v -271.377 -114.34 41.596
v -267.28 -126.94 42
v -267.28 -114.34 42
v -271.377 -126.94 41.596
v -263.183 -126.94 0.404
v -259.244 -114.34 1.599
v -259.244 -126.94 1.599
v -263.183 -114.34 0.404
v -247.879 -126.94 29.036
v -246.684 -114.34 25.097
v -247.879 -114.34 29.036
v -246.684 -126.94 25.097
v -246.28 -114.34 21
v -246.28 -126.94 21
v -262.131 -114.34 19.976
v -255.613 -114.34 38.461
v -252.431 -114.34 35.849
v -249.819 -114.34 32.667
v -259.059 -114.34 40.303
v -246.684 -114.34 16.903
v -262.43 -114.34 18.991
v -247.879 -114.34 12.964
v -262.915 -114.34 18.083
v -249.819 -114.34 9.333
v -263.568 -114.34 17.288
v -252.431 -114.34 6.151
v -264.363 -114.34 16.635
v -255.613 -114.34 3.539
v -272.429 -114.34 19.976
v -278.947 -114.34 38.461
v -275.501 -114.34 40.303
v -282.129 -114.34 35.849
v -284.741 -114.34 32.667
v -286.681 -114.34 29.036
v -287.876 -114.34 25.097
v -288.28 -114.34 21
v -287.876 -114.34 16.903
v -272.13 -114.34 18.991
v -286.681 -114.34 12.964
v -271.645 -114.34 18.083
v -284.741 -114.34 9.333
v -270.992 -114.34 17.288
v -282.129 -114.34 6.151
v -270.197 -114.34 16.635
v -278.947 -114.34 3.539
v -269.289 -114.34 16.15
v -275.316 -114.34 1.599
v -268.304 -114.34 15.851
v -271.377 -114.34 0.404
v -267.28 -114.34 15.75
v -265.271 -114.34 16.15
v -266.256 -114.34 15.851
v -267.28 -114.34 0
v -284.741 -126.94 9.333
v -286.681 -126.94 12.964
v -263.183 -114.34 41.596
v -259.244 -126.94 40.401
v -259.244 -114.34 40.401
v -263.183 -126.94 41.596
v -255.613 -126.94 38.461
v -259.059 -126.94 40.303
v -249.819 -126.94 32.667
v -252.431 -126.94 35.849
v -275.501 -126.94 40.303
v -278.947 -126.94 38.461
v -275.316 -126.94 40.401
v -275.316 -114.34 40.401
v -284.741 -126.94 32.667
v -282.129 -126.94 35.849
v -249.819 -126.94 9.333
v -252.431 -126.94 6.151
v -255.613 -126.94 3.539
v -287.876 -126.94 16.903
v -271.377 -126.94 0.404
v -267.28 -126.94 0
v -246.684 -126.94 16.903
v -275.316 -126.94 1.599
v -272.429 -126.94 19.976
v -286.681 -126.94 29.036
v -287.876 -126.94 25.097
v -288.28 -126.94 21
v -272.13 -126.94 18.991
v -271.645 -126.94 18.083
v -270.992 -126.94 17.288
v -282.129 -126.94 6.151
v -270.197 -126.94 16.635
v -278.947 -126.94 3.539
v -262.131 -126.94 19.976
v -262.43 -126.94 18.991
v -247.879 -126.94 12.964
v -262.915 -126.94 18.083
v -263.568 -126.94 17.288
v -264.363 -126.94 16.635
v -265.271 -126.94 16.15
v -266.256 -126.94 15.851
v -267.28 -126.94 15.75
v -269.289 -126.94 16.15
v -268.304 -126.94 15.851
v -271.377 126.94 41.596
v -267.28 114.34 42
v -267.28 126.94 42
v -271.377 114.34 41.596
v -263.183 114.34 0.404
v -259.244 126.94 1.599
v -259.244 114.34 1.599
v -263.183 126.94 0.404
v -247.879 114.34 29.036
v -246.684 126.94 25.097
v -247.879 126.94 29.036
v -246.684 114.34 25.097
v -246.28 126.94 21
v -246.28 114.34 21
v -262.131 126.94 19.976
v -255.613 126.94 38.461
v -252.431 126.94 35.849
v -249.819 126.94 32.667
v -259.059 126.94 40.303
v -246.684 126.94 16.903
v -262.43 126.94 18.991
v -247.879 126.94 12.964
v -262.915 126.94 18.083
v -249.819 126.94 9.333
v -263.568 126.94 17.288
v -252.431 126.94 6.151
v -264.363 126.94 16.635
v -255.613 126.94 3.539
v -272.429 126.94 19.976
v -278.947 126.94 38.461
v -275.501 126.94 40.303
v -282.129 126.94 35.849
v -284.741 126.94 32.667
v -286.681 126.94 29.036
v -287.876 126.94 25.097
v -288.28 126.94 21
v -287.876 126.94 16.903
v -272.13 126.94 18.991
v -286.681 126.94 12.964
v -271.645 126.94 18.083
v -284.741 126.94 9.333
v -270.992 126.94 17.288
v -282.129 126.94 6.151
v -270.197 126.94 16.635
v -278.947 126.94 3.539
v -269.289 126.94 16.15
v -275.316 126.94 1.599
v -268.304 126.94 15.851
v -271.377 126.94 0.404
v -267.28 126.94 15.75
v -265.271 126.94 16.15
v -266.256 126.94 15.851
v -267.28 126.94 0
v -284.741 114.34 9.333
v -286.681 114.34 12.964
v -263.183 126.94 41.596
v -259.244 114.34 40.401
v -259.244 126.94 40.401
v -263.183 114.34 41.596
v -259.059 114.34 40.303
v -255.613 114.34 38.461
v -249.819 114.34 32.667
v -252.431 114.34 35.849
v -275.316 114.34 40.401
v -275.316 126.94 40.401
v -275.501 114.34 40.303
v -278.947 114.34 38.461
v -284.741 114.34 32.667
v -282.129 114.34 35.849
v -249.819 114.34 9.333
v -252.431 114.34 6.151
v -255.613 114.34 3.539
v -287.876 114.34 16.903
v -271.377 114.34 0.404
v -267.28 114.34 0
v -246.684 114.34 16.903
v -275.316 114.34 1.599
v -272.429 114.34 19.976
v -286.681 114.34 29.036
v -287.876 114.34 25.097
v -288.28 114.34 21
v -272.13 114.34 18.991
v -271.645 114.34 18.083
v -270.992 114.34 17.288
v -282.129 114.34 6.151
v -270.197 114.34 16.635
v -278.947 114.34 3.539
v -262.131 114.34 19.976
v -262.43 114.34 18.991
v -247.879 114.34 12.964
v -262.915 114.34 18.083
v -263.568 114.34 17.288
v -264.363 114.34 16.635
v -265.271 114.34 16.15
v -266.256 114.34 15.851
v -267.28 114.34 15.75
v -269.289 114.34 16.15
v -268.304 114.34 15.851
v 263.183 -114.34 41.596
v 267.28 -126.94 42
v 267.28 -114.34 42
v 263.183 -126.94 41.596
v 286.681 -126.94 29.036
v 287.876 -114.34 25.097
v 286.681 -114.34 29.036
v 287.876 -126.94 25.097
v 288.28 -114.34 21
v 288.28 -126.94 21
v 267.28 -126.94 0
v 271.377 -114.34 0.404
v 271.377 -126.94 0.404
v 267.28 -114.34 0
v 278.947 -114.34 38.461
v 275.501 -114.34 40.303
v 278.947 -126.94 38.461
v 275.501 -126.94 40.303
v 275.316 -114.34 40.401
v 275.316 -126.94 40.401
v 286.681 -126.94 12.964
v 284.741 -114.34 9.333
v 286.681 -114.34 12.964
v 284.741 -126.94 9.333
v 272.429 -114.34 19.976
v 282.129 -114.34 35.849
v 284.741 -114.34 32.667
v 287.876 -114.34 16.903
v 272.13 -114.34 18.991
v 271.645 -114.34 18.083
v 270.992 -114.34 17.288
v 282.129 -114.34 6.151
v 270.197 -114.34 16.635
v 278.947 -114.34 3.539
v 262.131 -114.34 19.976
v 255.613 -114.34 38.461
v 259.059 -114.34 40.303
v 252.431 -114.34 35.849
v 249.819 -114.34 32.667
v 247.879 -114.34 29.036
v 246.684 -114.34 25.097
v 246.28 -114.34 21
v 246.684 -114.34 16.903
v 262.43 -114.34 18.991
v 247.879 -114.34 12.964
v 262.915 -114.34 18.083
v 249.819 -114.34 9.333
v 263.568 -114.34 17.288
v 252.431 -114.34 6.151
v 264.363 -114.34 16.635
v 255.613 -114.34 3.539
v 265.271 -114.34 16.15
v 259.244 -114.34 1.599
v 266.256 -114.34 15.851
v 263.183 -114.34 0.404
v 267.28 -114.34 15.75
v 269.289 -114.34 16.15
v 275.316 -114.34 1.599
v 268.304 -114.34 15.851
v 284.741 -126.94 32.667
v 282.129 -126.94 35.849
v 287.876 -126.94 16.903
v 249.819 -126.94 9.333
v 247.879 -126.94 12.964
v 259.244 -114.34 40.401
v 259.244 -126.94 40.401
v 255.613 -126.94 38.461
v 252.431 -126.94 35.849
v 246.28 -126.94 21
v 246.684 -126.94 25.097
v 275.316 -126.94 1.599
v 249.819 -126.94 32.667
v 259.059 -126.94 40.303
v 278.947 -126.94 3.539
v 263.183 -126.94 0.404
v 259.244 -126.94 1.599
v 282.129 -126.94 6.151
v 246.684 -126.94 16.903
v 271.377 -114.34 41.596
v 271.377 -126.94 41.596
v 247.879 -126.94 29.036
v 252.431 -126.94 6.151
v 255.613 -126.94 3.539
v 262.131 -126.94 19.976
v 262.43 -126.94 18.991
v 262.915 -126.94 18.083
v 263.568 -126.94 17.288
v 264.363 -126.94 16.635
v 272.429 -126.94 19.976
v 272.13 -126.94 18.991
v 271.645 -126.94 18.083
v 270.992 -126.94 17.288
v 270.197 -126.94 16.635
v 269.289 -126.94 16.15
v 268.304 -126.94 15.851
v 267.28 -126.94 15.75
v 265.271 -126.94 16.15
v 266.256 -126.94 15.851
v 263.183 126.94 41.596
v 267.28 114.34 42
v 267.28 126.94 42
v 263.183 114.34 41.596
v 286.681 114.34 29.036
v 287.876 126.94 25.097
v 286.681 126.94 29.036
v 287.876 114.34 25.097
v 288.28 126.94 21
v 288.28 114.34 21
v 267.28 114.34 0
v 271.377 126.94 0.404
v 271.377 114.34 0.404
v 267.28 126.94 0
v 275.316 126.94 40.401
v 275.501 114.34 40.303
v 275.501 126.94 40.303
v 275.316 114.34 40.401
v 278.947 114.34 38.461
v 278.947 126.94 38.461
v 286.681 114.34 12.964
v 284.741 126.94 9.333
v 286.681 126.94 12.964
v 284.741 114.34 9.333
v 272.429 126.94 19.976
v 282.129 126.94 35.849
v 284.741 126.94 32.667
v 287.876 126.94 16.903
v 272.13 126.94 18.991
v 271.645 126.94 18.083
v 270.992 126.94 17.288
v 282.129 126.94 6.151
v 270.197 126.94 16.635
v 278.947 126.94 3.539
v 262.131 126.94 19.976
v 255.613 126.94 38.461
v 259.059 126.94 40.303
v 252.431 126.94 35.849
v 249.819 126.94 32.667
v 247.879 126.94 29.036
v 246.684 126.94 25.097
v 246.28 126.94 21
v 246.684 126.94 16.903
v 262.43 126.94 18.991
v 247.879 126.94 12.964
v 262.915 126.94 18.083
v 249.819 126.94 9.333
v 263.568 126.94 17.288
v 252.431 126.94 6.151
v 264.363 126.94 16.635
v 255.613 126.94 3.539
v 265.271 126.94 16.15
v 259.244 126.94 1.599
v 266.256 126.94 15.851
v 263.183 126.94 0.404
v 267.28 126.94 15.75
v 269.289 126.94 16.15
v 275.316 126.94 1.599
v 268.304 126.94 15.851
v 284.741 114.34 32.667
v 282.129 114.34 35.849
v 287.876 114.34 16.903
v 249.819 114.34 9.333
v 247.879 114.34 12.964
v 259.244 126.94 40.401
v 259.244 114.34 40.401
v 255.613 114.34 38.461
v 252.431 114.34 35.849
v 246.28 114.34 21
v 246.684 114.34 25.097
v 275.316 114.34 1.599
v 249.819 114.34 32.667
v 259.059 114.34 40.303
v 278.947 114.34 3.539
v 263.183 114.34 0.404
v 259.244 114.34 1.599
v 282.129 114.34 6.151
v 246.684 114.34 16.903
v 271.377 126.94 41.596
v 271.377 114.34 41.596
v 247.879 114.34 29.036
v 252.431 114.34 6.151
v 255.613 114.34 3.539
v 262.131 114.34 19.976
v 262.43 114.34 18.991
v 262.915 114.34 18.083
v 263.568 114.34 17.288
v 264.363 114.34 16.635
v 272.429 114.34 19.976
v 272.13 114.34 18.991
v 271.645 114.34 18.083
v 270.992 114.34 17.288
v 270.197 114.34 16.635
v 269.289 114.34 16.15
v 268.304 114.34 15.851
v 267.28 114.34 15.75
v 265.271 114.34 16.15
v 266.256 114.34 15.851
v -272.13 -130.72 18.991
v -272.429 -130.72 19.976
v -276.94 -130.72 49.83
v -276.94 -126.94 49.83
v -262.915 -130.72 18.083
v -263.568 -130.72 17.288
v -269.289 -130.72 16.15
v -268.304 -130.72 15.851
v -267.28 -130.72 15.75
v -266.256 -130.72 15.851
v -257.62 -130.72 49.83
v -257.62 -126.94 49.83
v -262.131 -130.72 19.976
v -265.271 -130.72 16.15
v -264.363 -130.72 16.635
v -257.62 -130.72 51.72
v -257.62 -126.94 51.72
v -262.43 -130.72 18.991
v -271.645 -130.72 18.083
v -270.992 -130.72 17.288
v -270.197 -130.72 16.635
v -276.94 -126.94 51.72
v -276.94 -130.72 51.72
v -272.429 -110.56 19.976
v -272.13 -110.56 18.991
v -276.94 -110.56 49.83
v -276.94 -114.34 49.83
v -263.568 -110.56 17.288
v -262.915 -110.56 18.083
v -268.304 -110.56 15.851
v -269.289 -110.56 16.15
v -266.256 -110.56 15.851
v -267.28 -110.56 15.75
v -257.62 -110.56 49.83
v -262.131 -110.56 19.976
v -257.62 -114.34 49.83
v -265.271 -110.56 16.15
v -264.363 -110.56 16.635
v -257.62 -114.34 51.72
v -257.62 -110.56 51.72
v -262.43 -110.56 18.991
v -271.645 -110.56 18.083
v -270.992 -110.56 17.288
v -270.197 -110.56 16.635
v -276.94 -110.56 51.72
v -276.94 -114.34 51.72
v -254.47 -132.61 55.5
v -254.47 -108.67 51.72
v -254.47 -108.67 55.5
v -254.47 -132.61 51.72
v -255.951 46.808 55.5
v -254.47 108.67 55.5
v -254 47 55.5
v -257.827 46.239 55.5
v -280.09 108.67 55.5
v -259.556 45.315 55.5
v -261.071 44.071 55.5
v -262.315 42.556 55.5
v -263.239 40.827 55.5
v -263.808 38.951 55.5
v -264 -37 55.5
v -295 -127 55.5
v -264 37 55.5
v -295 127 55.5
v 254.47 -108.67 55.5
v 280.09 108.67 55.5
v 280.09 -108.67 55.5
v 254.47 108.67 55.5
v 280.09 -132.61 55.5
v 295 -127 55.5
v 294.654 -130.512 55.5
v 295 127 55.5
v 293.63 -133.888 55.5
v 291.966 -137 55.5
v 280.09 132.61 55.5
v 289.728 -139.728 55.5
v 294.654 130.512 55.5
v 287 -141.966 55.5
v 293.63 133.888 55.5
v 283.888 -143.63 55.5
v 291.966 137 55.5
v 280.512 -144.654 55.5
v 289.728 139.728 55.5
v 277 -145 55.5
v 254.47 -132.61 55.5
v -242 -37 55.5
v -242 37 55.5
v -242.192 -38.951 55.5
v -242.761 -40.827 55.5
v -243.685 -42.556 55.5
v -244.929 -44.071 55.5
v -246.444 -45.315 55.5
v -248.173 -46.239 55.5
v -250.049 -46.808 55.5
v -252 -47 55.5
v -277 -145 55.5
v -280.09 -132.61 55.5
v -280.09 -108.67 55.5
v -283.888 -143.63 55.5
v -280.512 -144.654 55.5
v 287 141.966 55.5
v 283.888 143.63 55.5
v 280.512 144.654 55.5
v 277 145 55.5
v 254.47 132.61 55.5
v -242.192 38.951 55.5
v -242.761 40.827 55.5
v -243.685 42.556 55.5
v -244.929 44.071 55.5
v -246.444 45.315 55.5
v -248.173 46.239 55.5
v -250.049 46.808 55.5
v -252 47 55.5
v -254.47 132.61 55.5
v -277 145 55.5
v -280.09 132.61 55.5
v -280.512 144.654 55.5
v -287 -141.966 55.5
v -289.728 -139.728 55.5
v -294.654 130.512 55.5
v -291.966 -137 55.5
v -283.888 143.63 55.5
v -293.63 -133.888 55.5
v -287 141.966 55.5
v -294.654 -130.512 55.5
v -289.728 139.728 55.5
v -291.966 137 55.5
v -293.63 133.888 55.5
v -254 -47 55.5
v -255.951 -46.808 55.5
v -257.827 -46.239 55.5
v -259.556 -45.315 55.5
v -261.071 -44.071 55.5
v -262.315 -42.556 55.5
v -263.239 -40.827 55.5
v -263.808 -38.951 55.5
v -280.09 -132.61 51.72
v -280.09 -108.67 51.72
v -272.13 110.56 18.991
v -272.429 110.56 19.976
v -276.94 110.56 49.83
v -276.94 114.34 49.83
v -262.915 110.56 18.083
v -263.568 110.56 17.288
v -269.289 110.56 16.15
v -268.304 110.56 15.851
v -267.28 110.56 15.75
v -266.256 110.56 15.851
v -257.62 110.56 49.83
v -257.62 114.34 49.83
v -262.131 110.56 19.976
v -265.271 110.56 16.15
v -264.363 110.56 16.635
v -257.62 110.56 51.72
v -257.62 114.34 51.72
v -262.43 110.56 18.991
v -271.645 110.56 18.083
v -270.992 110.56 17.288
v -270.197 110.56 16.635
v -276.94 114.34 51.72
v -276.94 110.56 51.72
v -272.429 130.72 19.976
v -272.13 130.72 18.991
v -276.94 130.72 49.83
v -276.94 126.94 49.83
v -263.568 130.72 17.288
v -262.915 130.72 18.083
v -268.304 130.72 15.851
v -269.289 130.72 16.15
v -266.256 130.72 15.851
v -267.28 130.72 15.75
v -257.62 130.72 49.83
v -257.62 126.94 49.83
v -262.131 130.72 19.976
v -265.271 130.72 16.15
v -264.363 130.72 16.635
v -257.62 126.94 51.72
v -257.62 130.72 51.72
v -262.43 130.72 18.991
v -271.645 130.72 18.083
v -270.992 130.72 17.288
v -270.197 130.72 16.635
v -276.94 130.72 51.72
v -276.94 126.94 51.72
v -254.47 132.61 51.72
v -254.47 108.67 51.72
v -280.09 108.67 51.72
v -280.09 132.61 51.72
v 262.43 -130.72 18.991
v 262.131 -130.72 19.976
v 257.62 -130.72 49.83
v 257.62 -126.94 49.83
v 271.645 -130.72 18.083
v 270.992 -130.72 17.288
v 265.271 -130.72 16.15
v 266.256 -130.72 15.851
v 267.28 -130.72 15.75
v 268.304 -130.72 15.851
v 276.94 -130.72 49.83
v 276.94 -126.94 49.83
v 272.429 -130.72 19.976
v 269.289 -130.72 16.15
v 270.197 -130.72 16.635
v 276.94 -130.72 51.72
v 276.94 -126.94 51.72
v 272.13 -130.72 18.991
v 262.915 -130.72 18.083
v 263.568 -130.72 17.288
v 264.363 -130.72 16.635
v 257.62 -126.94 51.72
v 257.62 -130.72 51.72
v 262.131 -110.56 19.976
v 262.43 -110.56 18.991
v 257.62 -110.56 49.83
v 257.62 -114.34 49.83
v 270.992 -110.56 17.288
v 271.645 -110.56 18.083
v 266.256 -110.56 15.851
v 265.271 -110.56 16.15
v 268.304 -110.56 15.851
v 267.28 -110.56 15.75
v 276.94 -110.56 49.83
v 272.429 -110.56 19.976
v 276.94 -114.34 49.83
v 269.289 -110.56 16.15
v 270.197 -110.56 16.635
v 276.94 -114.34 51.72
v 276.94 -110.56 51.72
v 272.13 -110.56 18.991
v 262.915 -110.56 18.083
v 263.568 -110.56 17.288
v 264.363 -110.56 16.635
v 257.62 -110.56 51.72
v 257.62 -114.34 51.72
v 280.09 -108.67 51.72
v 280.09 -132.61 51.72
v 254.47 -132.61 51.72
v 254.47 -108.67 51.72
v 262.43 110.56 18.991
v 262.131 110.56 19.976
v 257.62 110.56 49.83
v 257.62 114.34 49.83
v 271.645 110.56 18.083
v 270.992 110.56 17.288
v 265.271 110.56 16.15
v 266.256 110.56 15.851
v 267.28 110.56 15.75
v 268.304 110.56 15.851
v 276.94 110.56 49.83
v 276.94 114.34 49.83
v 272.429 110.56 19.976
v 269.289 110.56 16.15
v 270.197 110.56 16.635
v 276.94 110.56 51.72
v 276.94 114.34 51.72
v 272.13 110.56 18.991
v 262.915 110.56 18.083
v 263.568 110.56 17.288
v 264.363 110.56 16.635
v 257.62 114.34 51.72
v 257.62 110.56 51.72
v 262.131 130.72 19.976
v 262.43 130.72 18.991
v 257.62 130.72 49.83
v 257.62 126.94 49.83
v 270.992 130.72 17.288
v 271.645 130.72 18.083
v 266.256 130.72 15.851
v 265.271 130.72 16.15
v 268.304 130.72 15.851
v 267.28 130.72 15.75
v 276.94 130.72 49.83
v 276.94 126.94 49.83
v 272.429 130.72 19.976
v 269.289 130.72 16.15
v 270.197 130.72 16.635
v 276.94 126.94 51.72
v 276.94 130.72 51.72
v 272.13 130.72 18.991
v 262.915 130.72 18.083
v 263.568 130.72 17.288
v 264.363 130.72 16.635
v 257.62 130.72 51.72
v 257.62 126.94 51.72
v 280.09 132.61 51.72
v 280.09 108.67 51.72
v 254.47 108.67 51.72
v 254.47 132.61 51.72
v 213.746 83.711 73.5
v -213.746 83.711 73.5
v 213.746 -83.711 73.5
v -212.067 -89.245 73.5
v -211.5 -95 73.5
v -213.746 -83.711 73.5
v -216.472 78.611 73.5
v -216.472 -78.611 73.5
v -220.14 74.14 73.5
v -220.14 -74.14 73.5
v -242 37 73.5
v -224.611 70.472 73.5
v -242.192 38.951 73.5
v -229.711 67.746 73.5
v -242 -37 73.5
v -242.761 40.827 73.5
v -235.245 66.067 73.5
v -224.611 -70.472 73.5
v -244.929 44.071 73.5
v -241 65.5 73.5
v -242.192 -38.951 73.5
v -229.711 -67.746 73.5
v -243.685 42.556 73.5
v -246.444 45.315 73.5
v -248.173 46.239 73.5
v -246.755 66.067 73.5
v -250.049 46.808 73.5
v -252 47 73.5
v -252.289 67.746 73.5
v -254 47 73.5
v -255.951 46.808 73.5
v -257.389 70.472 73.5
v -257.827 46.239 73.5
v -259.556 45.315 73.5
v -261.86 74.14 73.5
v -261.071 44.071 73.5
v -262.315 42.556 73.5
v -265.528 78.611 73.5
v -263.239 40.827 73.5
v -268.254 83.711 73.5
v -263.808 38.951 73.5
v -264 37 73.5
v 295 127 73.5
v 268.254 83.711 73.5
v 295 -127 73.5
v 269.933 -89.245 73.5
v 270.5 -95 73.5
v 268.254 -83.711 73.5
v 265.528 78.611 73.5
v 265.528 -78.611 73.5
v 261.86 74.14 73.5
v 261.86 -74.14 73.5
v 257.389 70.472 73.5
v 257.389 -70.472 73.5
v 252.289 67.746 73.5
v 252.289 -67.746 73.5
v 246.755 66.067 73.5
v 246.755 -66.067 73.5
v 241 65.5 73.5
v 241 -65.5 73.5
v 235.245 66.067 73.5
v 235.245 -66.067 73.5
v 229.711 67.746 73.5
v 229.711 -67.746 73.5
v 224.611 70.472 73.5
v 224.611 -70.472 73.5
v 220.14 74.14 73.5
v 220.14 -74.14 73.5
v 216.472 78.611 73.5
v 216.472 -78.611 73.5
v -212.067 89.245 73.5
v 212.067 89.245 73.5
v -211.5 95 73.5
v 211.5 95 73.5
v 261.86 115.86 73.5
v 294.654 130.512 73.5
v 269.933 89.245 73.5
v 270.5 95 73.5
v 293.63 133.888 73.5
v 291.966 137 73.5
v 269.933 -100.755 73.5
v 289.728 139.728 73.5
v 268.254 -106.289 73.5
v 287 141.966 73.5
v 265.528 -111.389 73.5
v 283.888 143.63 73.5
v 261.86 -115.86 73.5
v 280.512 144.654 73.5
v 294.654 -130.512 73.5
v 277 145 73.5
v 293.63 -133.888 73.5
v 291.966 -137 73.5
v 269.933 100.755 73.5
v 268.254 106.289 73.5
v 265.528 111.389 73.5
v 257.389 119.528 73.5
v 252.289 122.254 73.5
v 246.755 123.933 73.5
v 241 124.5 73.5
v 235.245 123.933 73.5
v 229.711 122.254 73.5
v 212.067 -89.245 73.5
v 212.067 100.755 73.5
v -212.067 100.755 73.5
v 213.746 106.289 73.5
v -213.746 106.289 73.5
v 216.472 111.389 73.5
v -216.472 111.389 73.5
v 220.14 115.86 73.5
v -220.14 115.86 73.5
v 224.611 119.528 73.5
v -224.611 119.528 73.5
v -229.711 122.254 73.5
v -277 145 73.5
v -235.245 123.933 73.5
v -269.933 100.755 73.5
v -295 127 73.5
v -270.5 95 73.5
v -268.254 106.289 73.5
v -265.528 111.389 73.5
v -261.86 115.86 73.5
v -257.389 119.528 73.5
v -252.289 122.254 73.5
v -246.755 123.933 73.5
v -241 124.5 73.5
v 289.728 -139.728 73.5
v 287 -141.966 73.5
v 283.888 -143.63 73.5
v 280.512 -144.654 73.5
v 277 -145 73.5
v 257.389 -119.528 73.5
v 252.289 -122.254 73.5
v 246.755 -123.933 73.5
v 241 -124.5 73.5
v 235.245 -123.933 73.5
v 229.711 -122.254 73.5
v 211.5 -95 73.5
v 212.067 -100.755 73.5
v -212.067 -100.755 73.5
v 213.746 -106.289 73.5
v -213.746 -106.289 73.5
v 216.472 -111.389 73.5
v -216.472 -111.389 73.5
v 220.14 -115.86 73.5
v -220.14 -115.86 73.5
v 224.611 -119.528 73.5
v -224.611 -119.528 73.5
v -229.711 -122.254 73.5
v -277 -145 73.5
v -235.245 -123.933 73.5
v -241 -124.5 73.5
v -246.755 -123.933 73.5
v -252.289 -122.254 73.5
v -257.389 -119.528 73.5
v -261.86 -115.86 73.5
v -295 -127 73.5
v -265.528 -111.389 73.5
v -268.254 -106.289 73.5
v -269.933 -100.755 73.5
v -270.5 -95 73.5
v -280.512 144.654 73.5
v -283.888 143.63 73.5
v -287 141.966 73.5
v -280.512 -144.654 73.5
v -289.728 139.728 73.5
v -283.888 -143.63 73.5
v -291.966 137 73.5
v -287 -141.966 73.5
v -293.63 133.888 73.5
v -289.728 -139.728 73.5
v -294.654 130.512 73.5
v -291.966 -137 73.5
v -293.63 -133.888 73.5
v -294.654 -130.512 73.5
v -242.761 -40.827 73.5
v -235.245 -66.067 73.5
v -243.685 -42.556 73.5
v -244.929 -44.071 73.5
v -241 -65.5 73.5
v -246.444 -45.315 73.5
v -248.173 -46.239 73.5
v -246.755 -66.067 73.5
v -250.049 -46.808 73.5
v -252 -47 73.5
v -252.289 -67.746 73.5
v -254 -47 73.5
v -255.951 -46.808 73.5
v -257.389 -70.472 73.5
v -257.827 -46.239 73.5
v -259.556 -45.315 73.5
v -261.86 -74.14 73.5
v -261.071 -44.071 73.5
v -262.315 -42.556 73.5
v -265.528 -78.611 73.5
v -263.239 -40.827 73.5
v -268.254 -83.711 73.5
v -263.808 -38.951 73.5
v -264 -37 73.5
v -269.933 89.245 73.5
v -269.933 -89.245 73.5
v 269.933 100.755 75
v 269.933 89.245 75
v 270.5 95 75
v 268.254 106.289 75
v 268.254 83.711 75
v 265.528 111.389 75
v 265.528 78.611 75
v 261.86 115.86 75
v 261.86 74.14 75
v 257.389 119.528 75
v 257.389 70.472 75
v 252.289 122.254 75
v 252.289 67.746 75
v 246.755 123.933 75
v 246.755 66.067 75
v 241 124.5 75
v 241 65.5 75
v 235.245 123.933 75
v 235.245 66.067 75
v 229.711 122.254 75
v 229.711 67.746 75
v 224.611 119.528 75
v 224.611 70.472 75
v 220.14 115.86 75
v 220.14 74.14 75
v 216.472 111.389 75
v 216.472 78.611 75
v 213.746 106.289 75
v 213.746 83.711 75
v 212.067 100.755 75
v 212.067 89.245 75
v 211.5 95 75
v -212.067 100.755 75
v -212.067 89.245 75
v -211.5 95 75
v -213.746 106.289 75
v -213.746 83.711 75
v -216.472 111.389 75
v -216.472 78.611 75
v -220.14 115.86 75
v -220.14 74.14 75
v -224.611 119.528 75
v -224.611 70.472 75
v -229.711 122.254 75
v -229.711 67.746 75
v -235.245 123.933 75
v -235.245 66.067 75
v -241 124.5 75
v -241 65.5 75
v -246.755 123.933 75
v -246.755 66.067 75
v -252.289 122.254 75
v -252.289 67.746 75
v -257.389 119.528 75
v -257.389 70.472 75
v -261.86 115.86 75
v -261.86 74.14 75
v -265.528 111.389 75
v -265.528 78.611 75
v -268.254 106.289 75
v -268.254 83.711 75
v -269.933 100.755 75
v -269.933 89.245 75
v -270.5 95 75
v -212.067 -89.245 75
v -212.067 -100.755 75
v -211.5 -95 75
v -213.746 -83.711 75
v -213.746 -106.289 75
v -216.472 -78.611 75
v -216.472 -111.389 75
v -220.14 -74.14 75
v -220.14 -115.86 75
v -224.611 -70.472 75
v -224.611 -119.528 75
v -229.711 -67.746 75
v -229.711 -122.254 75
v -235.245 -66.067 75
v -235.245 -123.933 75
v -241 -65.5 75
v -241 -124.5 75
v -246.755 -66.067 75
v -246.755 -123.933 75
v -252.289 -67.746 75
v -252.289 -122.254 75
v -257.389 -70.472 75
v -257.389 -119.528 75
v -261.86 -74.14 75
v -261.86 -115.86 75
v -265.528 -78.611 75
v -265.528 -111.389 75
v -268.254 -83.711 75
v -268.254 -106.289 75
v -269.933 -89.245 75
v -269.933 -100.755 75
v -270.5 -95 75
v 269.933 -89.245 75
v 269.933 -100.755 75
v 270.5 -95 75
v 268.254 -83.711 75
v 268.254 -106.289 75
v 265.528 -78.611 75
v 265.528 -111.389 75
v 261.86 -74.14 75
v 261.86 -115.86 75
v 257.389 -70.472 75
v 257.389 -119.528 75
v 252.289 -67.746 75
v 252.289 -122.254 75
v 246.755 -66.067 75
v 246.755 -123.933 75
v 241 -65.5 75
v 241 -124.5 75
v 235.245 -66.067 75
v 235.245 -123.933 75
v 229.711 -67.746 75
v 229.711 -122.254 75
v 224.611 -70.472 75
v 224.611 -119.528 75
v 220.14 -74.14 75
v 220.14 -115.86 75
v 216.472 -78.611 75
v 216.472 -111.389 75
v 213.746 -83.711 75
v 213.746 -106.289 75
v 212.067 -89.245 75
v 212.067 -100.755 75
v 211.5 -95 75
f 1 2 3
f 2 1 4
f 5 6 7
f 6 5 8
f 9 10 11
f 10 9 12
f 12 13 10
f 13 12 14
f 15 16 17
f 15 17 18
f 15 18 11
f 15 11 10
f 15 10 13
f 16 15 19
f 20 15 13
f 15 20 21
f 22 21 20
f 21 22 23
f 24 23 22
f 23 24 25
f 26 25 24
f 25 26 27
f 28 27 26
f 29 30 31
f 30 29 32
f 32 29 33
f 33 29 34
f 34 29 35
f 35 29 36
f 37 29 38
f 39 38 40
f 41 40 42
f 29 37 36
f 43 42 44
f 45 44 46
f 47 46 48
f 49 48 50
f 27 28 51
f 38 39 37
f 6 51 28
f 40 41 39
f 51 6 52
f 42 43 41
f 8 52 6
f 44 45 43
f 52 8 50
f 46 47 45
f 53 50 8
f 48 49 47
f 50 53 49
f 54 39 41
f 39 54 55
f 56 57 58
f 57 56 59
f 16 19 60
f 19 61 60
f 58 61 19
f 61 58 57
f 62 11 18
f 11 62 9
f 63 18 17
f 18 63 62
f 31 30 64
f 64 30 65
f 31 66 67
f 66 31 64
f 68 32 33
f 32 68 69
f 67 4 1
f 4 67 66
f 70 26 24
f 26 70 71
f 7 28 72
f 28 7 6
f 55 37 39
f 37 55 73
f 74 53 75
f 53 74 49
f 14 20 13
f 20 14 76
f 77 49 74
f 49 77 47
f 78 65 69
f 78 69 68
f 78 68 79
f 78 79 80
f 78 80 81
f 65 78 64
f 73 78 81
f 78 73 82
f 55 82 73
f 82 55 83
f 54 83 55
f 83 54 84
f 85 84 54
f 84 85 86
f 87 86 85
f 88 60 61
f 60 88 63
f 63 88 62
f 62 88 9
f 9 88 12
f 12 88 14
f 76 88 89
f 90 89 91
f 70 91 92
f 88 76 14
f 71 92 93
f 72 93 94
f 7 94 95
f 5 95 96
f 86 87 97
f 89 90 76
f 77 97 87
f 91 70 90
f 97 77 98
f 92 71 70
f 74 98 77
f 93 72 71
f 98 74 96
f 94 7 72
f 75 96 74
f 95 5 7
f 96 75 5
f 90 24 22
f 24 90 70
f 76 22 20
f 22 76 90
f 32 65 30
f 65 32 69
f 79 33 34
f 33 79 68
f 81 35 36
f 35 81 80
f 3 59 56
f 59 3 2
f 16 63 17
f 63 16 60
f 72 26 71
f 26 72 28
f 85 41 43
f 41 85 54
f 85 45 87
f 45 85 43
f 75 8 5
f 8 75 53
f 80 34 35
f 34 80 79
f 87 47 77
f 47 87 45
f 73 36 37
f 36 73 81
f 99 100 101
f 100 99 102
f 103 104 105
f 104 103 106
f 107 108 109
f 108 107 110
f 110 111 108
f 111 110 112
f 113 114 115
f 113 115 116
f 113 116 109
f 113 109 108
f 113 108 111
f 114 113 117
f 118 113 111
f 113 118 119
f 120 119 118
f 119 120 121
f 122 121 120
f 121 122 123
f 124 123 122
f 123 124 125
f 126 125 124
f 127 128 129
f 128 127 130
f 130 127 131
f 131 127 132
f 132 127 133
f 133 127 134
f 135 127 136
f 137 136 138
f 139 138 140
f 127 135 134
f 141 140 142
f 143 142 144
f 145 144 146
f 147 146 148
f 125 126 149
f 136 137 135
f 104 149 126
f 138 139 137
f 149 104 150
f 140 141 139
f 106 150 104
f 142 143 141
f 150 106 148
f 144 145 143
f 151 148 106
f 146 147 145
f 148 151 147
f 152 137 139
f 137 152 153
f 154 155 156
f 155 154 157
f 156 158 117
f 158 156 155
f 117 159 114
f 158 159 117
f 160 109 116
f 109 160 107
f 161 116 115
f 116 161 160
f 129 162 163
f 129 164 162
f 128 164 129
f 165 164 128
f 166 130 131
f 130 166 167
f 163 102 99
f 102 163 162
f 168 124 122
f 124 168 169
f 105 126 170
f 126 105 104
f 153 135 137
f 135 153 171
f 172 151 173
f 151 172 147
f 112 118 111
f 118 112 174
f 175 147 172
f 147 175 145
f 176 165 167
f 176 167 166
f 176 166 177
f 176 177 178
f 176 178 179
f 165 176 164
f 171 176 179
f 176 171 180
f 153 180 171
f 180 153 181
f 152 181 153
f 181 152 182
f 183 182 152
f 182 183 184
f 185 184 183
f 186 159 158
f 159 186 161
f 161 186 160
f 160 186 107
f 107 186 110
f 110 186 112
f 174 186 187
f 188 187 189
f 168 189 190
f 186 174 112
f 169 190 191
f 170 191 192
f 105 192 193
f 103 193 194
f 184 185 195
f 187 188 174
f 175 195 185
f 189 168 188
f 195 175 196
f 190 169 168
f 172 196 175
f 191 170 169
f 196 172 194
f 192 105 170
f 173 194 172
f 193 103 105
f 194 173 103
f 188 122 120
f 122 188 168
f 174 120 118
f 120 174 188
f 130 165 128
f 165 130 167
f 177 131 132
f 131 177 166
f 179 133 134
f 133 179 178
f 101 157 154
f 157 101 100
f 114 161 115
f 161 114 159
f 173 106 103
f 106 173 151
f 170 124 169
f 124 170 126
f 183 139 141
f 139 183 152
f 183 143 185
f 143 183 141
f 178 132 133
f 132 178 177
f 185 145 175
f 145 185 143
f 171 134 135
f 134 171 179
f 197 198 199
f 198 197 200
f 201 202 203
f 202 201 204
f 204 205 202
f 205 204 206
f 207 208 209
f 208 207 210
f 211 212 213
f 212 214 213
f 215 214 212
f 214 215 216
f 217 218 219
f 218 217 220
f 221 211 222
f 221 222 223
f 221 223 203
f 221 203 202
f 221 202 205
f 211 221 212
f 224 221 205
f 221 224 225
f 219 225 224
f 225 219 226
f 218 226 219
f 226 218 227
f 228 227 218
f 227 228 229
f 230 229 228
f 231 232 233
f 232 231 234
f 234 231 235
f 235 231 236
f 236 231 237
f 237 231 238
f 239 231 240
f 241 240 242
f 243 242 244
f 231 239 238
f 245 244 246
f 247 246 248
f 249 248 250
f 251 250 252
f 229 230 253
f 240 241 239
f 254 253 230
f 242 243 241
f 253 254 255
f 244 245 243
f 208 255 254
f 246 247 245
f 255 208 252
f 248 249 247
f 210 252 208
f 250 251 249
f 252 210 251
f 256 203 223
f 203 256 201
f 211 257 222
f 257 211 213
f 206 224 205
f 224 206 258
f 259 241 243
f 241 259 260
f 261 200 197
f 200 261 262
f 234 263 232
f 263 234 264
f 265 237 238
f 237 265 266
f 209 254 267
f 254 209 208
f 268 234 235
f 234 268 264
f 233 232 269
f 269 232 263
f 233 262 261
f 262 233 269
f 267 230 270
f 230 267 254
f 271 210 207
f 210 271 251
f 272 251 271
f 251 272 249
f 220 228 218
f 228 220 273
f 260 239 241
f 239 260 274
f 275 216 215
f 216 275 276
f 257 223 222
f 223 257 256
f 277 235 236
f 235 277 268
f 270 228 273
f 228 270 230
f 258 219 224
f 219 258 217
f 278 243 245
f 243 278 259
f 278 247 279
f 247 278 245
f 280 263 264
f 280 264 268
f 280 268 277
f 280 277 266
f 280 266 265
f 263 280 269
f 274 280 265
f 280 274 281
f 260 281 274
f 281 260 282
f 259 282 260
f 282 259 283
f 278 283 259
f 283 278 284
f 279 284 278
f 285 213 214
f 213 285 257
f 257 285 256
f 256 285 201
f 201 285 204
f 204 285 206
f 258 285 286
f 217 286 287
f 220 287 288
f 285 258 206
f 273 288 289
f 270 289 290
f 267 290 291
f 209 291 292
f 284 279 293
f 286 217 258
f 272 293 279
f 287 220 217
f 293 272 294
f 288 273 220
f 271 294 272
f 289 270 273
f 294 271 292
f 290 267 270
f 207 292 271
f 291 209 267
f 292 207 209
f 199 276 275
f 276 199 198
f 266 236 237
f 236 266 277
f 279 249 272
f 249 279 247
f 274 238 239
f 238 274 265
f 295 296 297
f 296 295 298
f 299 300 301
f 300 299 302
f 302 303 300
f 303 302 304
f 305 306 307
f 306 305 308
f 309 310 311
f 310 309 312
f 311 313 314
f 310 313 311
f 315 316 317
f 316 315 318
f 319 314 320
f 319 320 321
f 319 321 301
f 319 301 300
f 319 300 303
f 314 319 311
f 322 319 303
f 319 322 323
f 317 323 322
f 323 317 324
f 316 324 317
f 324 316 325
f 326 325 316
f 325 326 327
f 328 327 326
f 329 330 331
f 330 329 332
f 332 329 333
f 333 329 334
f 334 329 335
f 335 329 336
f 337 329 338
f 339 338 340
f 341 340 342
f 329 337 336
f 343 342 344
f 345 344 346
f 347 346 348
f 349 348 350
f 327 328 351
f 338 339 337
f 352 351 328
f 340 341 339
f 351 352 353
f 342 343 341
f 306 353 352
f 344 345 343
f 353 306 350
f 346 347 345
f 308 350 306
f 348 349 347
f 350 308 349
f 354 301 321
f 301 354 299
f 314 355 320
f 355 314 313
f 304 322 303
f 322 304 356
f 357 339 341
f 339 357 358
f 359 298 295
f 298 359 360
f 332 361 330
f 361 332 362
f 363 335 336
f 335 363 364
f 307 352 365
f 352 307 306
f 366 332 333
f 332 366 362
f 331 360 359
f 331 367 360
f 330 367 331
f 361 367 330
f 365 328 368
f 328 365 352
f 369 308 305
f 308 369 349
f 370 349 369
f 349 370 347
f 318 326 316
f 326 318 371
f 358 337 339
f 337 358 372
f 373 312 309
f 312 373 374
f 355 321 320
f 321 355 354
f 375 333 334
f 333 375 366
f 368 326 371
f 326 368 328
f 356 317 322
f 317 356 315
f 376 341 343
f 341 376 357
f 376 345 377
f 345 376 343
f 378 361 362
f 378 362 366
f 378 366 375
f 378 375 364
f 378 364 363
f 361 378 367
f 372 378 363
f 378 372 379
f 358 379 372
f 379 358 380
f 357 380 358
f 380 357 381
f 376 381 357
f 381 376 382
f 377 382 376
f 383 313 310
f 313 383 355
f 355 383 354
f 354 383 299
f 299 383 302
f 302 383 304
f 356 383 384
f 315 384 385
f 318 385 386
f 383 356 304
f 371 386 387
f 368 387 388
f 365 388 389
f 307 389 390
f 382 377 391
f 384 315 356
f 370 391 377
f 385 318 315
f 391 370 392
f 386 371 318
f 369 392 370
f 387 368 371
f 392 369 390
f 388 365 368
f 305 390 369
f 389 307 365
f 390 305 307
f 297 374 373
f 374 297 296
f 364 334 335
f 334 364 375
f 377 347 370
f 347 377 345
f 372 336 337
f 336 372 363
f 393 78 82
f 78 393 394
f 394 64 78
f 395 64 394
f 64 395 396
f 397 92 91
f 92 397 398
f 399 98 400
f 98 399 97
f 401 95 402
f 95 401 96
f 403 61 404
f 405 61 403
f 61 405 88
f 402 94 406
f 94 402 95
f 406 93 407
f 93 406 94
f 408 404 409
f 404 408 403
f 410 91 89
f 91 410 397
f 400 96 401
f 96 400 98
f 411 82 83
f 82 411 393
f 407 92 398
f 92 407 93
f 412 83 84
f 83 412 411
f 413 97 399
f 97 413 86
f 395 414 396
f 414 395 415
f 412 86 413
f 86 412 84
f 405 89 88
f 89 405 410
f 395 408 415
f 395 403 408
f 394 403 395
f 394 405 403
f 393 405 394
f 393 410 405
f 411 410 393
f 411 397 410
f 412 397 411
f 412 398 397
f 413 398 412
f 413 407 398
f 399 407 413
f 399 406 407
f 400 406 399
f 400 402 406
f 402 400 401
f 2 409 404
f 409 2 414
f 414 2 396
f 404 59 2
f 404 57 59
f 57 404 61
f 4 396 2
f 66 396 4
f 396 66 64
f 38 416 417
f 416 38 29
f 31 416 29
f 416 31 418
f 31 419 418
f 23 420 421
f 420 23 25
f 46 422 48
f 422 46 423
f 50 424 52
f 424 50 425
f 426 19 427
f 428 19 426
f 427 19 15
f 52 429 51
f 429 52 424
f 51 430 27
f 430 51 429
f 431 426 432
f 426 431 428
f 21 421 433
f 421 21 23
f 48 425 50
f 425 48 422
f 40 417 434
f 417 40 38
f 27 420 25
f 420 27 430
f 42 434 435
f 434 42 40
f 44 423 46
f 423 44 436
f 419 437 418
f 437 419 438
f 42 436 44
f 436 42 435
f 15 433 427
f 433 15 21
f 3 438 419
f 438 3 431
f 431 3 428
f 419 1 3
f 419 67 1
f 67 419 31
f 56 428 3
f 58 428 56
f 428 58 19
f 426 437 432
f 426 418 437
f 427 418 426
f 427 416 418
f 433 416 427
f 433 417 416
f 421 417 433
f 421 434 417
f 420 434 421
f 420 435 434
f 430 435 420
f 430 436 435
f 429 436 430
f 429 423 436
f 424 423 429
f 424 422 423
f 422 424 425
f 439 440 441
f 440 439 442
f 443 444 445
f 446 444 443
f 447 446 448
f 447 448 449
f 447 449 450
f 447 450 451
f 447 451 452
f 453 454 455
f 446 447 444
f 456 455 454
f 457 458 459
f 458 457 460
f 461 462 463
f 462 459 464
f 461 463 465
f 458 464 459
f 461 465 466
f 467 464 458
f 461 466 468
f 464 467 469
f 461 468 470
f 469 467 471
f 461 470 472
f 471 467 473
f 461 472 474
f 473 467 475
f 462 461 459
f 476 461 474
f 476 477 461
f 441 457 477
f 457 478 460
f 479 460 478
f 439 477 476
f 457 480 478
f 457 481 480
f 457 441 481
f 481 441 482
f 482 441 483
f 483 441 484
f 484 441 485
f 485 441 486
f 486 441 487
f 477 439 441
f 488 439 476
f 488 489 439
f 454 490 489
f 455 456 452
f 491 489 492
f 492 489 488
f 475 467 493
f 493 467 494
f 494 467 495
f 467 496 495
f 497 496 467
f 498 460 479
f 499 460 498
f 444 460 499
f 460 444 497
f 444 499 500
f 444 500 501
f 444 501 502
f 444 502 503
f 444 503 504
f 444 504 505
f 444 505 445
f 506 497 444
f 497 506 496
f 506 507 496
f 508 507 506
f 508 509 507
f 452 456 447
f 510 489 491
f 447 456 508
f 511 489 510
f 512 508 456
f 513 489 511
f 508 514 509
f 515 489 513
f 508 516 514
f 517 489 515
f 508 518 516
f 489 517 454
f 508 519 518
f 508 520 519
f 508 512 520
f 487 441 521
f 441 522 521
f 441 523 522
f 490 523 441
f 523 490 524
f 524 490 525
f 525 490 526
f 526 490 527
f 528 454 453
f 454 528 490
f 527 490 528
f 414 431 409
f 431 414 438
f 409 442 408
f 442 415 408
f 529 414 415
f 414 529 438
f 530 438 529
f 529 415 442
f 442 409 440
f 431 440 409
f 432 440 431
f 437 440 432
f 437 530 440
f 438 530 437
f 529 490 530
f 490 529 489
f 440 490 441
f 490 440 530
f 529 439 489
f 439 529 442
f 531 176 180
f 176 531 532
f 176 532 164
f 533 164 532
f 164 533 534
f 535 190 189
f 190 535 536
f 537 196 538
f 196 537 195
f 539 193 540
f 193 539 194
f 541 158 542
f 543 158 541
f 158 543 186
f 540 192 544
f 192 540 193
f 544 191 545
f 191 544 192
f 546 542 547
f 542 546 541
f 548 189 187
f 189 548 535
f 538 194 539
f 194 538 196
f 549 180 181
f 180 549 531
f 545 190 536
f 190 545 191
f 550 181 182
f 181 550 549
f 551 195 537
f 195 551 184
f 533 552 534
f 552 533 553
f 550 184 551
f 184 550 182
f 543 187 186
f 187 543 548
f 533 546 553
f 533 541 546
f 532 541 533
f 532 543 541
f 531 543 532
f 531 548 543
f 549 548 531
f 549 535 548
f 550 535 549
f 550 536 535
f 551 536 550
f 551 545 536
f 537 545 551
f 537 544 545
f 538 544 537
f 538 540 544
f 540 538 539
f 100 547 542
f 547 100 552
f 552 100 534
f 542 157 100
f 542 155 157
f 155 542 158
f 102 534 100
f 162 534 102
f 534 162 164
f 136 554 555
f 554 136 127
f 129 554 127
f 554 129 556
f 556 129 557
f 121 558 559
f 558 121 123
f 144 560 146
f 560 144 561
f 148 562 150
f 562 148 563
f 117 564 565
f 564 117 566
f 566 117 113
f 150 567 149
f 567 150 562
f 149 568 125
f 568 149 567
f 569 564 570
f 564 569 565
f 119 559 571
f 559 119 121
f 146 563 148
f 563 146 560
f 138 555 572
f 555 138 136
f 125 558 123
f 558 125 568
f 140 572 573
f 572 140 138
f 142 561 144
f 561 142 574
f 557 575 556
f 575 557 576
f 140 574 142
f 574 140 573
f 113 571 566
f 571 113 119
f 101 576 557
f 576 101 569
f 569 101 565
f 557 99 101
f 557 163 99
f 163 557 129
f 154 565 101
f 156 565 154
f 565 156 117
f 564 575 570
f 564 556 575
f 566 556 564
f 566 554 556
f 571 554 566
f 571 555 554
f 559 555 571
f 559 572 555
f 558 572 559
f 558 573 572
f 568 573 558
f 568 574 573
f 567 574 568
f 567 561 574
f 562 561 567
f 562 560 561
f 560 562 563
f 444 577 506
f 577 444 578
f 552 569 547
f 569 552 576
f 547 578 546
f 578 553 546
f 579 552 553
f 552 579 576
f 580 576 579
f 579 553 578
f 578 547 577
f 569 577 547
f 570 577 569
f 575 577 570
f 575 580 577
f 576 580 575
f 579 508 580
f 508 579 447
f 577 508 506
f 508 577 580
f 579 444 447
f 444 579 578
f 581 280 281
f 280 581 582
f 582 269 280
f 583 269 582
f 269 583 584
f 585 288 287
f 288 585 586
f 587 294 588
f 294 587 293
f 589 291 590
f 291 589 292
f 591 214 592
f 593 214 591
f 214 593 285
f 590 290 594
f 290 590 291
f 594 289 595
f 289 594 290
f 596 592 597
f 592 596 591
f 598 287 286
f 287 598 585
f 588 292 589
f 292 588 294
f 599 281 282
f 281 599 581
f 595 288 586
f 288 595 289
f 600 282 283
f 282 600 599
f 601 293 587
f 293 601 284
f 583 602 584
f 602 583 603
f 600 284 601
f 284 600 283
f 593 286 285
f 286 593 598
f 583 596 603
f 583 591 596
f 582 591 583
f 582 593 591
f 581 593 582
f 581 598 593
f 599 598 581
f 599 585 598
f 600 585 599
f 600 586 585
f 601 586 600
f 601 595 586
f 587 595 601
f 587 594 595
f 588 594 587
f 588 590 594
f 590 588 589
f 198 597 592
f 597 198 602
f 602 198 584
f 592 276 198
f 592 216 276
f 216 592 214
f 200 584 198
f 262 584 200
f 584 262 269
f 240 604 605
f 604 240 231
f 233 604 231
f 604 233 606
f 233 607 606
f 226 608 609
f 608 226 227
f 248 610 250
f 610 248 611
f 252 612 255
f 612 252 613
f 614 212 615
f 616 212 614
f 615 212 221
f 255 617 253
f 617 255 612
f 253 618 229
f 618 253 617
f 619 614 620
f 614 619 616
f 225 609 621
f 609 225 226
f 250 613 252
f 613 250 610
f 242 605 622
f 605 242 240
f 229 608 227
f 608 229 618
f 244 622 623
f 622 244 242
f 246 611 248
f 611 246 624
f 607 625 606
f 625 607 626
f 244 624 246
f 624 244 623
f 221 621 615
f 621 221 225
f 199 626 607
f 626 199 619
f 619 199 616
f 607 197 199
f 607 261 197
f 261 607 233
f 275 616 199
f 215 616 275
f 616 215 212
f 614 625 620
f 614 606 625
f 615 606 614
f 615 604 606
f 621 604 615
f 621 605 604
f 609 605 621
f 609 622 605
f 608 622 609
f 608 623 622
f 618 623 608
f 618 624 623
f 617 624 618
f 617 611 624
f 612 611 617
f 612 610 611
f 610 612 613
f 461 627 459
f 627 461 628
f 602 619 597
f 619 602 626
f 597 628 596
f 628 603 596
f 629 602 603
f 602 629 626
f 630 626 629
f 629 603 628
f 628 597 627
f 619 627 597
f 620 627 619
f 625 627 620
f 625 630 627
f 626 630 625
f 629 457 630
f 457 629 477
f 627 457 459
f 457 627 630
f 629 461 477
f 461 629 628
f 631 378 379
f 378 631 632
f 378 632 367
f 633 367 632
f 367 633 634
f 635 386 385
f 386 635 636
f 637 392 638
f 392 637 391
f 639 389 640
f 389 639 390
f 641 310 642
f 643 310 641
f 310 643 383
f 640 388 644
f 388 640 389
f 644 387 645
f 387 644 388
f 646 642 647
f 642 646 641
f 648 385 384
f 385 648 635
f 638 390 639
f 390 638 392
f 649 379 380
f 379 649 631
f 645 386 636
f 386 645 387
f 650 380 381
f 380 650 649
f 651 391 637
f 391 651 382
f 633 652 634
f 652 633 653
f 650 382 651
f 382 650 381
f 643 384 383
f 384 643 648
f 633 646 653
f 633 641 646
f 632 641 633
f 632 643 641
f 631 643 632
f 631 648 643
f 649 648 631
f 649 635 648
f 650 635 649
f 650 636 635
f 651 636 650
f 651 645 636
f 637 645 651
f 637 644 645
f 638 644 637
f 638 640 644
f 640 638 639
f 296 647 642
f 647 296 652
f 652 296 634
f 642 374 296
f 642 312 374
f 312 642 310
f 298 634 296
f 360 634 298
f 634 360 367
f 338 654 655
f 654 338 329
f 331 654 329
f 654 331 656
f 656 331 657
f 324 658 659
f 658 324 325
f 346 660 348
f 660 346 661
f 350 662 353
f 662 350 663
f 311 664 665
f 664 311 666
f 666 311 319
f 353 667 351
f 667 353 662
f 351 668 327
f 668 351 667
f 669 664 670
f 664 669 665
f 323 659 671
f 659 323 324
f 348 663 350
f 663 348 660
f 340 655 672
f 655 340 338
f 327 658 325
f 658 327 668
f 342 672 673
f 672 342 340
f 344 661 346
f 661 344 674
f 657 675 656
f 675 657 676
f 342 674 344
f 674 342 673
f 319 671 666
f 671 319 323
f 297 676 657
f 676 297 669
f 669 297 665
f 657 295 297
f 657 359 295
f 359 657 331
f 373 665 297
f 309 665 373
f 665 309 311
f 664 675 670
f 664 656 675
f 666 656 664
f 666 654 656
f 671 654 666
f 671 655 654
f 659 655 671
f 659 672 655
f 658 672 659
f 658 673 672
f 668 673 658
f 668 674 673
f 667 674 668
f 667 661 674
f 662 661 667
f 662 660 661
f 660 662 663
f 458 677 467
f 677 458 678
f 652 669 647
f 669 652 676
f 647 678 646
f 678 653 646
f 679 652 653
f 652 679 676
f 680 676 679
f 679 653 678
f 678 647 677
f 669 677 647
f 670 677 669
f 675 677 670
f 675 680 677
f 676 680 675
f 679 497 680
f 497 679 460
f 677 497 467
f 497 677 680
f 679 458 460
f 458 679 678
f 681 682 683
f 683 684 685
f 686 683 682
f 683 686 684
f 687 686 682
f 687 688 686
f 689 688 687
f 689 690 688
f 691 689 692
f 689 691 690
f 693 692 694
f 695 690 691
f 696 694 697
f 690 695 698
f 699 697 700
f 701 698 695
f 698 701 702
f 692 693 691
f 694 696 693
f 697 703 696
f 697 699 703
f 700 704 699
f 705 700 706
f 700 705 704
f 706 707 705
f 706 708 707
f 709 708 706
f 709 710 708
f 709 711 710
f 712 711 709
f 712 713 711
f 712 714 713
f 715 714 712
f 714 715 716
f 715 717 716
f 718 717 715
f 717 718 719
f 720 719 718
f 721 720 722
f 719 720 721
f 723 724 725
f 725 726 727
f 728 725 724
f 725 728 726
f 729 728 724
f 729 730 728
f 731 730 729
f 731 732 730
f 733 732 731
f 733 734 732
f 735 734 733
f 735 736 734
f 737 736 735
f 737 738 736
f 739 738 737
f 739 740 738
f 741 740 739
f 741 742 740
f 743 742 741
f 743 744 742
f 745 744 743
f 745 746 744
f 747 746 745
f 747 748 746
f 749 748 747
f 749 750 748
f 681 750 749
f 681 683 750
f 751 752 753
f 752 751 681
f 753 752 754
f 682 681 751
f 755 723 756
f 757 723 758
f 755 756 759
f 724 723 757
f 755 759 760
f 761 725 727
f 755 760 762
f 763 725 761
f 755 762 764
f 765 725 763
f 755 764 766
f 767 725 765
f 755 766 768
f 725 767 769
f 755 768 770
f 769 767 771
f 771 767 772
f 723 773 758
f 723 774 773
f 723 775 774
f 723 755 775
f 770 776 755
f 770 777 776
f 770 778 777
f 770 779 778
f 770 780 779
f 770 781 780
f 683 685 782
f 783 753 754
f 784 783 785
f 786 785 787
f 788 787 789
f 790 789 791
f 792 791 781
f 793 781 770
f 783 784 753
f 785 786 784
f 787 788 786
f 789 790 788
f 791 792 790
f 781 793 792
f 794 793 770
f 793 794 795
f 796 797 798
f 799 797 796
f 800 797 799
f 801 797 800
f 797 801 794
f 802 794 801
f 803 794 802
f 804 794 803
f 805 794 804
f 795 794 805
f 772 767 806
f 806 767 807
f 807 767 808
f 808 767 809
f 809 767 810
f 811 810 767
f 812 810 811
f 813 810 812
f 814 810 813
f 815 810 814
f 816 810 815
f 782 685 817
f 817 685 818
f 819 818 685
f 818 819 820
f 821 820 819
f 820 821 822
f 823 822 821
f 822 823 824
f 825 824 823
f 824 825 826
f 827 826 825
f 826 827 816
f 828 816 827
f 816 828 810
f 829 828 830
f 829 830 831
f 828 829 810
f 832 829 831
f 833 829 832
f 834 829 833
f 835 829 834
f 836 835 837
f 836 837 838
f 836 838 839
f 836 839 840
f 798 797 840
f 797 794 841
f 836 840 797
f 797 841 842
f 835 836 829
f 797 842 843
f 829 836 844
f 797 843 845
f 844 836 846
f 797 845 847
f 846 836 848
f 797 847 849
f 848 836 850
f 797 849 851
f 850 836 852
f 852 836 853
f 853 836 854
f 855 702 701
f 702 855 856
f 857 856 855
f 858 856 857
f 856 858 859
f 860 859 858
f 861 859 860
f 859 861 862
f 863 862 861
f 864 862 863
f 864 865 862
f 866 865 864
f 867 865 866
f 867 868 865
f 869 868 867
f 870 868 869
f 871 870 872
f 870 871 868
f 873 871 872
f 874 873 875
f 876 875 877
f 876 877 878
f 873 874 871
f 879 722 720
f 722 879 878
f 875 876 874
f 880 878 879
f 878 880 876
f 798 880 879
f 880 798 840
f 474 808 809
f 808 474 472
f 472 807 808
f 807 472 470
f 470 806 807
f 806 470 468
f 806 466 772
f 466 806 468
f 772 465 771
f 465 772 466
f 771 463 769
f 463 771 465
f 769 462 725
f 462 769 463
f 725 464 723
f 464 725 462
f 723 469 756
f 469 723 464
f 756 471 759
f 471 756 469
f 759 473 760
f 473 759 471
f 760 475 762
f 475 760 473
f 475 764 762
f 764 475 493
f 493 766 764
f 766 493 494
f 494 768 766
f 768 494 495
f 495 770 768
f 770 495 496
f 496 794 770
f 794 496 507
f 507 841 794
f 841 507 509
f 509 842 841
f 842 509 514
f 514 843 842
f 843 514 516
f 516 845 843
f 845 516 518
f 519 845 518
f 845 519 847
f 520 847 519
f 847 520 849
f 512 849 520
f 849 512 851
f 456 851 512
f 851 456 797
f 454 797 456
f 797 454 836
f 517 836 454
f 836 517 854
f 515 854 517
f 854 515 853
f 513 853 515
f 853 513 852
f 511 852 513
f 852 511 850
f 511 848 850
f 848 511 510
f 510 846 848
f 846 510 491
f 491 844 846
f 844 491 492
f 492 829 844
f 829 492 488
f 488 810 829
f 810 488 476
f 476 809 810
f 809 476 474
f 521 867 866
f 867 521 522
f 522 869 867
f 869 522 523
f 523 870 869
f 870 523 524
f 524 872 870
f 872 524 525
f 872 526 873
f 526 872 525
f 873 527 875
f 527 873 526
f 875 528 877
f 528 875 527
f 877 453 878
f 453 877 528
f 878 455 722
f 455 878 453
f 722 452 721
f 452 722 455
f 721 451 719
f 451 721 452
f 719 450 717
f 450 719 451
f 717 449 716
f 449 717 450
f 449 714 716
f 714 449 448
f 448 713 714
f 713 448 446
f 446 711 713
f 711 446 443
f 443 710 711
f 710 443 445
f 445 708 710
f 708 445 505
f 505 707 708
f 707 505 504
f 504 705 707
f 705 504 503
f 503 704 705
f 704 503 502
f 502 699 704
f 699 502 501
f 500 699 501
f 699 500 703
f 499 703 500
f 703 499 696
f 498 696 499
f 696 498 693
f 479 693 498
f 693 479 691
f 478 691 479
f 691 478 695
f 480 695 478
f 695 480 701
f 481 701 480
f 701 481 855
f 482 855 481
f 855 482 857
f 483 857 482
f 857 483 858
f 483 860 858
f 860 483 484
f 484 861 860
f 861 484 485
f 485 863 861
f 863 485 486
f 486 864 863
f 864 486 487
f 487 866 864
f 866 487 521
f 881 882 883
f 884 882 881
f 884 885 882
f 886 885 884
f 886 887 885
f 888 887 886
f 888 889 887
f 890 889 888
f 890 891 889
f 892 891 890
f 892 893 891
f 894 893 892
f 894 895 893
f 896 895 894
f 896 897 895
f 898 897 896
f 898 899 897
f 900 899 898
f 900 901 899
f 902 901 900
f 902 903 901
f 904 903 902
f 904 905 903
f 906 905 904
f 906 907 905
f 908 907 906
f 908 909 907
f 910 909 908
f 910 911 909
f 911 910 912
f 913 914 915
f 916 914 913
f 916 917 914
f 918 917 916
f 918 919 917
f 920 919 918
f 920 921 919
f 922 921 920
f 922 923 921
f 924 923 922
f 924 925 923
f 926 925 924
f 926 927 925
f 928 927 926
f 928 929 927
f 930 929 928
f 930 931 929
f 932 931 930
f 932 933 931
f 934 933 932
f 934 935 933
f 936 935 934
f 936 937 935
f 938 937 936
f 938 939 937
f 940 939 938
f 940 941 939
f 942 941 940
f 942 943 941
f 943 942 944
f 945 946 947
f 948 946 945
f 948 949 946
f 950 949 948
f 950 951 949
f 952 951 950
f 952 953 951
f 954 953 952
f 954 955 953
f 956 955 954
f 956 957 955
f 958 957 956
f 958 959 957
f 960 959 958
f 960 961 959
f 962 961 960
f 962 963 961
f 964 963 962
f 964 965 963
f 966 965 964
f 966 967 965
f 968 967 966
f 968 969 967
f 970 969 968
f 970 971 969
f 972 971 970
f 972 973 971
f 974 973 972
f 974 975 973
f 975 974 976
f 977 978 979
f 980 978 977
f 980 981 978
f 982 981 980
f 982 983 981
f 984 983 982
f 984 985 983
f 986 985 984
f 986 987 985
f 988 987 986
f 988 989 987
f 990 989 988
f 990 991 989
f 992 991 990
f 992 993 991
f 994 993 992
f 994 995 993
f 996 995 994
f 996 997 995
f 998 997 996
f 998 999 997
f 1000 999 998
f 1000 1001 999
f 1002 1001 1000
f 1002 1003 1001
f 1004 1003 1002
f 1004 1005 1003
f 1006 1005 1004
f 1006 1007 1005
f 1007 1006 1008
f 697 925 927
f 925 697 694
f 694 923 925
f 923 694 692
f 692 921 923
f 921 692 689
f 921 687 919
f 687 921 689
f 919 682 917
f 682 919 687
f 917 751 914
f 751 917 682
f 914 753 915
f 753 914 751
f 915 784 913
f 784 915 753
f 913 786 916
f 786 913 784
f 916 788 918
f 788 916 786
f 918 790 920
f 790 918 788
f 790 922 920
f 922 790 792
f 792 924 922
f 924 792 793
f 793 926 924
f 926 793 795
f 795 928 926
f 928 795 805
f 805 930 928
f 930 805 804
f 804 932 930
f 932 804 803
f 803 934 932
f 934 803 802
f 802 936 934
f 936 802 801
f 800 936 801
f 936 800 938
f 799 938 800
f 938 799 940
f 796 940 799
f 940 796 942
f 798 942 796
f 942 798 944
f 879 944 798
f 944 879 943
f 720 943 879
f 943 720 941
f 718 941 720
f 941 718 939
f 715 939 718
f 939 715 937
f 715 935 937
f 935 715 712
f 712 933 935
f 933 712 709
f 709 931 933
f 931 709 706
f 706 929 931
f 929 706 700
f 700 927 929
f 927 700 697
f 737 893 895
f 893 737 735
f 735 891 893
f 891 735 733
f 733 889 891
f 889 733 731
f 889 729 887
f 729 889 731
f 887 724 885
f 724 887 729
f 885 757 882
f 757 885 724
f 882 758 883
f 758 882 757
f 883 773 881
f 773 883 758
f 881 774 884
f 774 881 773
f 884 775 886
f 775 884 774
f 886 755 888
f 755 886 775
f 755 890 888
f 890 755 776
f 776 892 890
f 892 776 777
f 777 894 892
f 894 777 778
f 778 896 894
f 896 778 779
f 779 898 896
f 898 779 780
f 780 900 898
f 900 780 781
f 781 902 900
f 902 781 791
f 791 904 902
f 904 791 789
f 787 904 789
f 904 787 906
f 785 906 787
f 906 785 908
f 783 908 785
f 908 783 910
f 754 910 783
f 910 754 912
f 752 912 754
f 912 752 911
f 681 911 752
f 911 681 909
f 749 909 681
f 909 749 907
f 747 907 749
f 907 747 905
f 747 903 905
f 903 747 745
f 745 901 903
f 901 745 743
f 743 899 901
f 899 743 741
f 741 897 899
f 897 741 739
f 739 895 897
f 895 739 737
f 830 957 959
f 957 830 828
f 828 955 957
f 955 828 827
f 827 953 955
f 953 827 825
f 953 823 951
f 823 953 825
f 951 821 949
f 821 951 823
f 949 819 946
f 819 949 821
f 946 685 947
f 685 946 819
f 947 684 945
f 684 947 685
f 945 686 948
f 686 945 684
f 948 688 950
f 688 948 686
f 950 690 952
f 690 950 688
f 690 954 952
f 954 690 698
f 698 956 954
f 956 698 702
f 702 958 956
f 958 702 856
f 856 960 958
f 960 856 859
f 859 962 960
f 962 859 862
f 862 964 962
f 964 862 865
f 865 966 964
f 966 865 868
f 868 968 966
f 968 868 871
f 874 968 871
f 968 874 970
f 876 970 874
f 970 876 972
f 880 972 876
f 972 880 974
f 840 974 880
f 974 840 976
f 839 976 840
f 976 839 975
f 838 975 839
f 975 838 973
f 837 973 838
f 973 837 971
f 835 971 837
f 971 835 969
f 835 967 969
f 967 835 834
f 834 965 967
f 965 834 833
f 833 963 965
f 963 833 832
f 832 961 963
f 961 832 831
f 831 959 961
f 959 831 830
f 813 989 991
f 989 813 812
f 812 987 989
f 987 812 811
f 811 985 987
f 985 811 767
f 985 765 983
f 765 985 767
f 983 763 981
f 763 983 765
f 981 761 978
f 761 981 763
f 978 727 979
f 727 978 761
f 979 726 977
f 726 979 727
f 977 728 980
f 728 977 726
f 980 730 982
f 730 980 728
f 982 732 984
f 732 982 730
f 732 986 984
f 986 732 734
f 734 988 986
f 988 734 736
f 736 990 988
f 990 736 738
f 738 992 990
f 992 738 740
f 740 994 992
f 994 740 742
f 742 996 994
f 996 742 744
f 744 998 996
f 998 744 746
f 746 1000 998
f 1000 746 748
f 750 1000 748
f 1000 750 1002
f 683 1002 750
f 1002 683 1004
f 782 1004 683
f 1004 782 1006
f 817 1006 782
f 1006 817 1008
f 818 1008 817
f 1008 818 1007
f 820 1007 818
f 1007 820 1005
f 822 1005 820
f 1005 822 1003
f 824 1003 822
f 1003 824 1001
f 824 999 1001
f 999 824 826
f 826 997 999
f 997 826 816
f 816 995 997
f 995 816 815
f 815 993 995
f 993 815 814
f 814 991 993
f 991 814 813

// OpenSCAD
style = "simple";
seat_depth = 0;
seat_length = 0;
seat_width = 0;
deck = 18;
height = 75;
length = 590;
wheel = 42;
width = 290;
deck_color = "#ca9876";
trim_color = "#28252a";
wheel_color = "#292b2f";
mount_color = "#9bA2A6";

// Dimensional reference in mm. X is length, Y is width and the floor is Z=0.
// The generated working.scad supplies the values above this template.
$fn = 32;
component = "all";
wood = style == "simple";
single_crate = style == "bale_arm_crate_single";
trim_height = wood ? 1.5 : single_crate ? seat_depth : 5;
deck_top = height - trim_height;
deck_base = deck_top - deck;
wheel_width = wheel * 0.30;
wheel_x = length / 2 - wheel * 0.66;
wheel_y = width / 2 - wheel * 0.58;

module rounded(l, w, radius) {
    offset(r=radius) square([l-2*radius, w-2*radius], center=true);
}

module octagon(l, w, c) {
    polygon([[-l/2+c,-w/2],[l/2-c,-w/2],[l/2,-w/2+c],[l/2,w/2-c],
             [l/2-c,w/2],[-l/2+c,w/2],[-l/2,w/2-c],[-l/2,-w/2+c]]);
}

module deck_outline() {
    difference() {
        rounded(length, width, wood ? 18 : 12);
        if (wood)
            translate([-length/2+42,0]) rounded(22,94,10);
        else if (single_crate)
            octagon(length*0.58, width*0.34, width*0.08);
        else
            for (s=[-1,1]) translate([s*length*0.24,0])
                rounded(length*0.14,width*0.23,9);
    }
}

module top_details() {
    if (wood)
        for (x=[-1,1], y=[-1,1])
            translate([x*(length/2-54),y*(width/2-50)]) circle(d=59);
    else if (single_crate)
        difference() {
            rounded(length,width,12);
            rounded(seat_length,seat_width,9);
        }
    else
        for (x=[-0.37,0,0.37], y=[-1,1])
            translate([x*length,y*(width/2-13)]) rounded(55,18,5);
}

module wheel_positions() {
    for (x=[-1,1], y=[-1,1])
        translate([x*wheel_x,y*wheel_y,0]) children();
}

module axle_cylinder(diameter, span) {
    rotate([90,0,0]) cylinder(d=diameter,h=span,center=true);
}

module bracket() {
    plate = wheel * 0.09;
    translate([0,0,deck_base-plate/2])
        cube([wheel*0.61,wheel_width+plate*3,plate], center=true);
    for (s=[-1,1])
        translate([0,s*(wheel_width/2+plate/2),0]) hull() {
            translate([0,0,wheel/2]) axle_cylinder(wheel*0.25,plate);
            translate([0,0,deck_base-plate]) cube([wheel*0.46,plate,plate],center=true);
        }
}

if (component=="all" || component=="deck")
    color(deck_color) translate([0,0,deck_base]) linear_extrude(deck) deck_outline();
if (component=="all" || component=="trim")
    color(trim_color) translate([0,0,deck_top]) linear_extrude(trim_height) top_details();
if (component=="all" || component=="wheels")
    color(wheel_color) wheel_positions() translate([0,0,wheel/2]) axle_cylinder(wheel,wheel_width);
if (component=="all" || component=="mounts")
    color(mount_color) wheel_positions() bracket();
